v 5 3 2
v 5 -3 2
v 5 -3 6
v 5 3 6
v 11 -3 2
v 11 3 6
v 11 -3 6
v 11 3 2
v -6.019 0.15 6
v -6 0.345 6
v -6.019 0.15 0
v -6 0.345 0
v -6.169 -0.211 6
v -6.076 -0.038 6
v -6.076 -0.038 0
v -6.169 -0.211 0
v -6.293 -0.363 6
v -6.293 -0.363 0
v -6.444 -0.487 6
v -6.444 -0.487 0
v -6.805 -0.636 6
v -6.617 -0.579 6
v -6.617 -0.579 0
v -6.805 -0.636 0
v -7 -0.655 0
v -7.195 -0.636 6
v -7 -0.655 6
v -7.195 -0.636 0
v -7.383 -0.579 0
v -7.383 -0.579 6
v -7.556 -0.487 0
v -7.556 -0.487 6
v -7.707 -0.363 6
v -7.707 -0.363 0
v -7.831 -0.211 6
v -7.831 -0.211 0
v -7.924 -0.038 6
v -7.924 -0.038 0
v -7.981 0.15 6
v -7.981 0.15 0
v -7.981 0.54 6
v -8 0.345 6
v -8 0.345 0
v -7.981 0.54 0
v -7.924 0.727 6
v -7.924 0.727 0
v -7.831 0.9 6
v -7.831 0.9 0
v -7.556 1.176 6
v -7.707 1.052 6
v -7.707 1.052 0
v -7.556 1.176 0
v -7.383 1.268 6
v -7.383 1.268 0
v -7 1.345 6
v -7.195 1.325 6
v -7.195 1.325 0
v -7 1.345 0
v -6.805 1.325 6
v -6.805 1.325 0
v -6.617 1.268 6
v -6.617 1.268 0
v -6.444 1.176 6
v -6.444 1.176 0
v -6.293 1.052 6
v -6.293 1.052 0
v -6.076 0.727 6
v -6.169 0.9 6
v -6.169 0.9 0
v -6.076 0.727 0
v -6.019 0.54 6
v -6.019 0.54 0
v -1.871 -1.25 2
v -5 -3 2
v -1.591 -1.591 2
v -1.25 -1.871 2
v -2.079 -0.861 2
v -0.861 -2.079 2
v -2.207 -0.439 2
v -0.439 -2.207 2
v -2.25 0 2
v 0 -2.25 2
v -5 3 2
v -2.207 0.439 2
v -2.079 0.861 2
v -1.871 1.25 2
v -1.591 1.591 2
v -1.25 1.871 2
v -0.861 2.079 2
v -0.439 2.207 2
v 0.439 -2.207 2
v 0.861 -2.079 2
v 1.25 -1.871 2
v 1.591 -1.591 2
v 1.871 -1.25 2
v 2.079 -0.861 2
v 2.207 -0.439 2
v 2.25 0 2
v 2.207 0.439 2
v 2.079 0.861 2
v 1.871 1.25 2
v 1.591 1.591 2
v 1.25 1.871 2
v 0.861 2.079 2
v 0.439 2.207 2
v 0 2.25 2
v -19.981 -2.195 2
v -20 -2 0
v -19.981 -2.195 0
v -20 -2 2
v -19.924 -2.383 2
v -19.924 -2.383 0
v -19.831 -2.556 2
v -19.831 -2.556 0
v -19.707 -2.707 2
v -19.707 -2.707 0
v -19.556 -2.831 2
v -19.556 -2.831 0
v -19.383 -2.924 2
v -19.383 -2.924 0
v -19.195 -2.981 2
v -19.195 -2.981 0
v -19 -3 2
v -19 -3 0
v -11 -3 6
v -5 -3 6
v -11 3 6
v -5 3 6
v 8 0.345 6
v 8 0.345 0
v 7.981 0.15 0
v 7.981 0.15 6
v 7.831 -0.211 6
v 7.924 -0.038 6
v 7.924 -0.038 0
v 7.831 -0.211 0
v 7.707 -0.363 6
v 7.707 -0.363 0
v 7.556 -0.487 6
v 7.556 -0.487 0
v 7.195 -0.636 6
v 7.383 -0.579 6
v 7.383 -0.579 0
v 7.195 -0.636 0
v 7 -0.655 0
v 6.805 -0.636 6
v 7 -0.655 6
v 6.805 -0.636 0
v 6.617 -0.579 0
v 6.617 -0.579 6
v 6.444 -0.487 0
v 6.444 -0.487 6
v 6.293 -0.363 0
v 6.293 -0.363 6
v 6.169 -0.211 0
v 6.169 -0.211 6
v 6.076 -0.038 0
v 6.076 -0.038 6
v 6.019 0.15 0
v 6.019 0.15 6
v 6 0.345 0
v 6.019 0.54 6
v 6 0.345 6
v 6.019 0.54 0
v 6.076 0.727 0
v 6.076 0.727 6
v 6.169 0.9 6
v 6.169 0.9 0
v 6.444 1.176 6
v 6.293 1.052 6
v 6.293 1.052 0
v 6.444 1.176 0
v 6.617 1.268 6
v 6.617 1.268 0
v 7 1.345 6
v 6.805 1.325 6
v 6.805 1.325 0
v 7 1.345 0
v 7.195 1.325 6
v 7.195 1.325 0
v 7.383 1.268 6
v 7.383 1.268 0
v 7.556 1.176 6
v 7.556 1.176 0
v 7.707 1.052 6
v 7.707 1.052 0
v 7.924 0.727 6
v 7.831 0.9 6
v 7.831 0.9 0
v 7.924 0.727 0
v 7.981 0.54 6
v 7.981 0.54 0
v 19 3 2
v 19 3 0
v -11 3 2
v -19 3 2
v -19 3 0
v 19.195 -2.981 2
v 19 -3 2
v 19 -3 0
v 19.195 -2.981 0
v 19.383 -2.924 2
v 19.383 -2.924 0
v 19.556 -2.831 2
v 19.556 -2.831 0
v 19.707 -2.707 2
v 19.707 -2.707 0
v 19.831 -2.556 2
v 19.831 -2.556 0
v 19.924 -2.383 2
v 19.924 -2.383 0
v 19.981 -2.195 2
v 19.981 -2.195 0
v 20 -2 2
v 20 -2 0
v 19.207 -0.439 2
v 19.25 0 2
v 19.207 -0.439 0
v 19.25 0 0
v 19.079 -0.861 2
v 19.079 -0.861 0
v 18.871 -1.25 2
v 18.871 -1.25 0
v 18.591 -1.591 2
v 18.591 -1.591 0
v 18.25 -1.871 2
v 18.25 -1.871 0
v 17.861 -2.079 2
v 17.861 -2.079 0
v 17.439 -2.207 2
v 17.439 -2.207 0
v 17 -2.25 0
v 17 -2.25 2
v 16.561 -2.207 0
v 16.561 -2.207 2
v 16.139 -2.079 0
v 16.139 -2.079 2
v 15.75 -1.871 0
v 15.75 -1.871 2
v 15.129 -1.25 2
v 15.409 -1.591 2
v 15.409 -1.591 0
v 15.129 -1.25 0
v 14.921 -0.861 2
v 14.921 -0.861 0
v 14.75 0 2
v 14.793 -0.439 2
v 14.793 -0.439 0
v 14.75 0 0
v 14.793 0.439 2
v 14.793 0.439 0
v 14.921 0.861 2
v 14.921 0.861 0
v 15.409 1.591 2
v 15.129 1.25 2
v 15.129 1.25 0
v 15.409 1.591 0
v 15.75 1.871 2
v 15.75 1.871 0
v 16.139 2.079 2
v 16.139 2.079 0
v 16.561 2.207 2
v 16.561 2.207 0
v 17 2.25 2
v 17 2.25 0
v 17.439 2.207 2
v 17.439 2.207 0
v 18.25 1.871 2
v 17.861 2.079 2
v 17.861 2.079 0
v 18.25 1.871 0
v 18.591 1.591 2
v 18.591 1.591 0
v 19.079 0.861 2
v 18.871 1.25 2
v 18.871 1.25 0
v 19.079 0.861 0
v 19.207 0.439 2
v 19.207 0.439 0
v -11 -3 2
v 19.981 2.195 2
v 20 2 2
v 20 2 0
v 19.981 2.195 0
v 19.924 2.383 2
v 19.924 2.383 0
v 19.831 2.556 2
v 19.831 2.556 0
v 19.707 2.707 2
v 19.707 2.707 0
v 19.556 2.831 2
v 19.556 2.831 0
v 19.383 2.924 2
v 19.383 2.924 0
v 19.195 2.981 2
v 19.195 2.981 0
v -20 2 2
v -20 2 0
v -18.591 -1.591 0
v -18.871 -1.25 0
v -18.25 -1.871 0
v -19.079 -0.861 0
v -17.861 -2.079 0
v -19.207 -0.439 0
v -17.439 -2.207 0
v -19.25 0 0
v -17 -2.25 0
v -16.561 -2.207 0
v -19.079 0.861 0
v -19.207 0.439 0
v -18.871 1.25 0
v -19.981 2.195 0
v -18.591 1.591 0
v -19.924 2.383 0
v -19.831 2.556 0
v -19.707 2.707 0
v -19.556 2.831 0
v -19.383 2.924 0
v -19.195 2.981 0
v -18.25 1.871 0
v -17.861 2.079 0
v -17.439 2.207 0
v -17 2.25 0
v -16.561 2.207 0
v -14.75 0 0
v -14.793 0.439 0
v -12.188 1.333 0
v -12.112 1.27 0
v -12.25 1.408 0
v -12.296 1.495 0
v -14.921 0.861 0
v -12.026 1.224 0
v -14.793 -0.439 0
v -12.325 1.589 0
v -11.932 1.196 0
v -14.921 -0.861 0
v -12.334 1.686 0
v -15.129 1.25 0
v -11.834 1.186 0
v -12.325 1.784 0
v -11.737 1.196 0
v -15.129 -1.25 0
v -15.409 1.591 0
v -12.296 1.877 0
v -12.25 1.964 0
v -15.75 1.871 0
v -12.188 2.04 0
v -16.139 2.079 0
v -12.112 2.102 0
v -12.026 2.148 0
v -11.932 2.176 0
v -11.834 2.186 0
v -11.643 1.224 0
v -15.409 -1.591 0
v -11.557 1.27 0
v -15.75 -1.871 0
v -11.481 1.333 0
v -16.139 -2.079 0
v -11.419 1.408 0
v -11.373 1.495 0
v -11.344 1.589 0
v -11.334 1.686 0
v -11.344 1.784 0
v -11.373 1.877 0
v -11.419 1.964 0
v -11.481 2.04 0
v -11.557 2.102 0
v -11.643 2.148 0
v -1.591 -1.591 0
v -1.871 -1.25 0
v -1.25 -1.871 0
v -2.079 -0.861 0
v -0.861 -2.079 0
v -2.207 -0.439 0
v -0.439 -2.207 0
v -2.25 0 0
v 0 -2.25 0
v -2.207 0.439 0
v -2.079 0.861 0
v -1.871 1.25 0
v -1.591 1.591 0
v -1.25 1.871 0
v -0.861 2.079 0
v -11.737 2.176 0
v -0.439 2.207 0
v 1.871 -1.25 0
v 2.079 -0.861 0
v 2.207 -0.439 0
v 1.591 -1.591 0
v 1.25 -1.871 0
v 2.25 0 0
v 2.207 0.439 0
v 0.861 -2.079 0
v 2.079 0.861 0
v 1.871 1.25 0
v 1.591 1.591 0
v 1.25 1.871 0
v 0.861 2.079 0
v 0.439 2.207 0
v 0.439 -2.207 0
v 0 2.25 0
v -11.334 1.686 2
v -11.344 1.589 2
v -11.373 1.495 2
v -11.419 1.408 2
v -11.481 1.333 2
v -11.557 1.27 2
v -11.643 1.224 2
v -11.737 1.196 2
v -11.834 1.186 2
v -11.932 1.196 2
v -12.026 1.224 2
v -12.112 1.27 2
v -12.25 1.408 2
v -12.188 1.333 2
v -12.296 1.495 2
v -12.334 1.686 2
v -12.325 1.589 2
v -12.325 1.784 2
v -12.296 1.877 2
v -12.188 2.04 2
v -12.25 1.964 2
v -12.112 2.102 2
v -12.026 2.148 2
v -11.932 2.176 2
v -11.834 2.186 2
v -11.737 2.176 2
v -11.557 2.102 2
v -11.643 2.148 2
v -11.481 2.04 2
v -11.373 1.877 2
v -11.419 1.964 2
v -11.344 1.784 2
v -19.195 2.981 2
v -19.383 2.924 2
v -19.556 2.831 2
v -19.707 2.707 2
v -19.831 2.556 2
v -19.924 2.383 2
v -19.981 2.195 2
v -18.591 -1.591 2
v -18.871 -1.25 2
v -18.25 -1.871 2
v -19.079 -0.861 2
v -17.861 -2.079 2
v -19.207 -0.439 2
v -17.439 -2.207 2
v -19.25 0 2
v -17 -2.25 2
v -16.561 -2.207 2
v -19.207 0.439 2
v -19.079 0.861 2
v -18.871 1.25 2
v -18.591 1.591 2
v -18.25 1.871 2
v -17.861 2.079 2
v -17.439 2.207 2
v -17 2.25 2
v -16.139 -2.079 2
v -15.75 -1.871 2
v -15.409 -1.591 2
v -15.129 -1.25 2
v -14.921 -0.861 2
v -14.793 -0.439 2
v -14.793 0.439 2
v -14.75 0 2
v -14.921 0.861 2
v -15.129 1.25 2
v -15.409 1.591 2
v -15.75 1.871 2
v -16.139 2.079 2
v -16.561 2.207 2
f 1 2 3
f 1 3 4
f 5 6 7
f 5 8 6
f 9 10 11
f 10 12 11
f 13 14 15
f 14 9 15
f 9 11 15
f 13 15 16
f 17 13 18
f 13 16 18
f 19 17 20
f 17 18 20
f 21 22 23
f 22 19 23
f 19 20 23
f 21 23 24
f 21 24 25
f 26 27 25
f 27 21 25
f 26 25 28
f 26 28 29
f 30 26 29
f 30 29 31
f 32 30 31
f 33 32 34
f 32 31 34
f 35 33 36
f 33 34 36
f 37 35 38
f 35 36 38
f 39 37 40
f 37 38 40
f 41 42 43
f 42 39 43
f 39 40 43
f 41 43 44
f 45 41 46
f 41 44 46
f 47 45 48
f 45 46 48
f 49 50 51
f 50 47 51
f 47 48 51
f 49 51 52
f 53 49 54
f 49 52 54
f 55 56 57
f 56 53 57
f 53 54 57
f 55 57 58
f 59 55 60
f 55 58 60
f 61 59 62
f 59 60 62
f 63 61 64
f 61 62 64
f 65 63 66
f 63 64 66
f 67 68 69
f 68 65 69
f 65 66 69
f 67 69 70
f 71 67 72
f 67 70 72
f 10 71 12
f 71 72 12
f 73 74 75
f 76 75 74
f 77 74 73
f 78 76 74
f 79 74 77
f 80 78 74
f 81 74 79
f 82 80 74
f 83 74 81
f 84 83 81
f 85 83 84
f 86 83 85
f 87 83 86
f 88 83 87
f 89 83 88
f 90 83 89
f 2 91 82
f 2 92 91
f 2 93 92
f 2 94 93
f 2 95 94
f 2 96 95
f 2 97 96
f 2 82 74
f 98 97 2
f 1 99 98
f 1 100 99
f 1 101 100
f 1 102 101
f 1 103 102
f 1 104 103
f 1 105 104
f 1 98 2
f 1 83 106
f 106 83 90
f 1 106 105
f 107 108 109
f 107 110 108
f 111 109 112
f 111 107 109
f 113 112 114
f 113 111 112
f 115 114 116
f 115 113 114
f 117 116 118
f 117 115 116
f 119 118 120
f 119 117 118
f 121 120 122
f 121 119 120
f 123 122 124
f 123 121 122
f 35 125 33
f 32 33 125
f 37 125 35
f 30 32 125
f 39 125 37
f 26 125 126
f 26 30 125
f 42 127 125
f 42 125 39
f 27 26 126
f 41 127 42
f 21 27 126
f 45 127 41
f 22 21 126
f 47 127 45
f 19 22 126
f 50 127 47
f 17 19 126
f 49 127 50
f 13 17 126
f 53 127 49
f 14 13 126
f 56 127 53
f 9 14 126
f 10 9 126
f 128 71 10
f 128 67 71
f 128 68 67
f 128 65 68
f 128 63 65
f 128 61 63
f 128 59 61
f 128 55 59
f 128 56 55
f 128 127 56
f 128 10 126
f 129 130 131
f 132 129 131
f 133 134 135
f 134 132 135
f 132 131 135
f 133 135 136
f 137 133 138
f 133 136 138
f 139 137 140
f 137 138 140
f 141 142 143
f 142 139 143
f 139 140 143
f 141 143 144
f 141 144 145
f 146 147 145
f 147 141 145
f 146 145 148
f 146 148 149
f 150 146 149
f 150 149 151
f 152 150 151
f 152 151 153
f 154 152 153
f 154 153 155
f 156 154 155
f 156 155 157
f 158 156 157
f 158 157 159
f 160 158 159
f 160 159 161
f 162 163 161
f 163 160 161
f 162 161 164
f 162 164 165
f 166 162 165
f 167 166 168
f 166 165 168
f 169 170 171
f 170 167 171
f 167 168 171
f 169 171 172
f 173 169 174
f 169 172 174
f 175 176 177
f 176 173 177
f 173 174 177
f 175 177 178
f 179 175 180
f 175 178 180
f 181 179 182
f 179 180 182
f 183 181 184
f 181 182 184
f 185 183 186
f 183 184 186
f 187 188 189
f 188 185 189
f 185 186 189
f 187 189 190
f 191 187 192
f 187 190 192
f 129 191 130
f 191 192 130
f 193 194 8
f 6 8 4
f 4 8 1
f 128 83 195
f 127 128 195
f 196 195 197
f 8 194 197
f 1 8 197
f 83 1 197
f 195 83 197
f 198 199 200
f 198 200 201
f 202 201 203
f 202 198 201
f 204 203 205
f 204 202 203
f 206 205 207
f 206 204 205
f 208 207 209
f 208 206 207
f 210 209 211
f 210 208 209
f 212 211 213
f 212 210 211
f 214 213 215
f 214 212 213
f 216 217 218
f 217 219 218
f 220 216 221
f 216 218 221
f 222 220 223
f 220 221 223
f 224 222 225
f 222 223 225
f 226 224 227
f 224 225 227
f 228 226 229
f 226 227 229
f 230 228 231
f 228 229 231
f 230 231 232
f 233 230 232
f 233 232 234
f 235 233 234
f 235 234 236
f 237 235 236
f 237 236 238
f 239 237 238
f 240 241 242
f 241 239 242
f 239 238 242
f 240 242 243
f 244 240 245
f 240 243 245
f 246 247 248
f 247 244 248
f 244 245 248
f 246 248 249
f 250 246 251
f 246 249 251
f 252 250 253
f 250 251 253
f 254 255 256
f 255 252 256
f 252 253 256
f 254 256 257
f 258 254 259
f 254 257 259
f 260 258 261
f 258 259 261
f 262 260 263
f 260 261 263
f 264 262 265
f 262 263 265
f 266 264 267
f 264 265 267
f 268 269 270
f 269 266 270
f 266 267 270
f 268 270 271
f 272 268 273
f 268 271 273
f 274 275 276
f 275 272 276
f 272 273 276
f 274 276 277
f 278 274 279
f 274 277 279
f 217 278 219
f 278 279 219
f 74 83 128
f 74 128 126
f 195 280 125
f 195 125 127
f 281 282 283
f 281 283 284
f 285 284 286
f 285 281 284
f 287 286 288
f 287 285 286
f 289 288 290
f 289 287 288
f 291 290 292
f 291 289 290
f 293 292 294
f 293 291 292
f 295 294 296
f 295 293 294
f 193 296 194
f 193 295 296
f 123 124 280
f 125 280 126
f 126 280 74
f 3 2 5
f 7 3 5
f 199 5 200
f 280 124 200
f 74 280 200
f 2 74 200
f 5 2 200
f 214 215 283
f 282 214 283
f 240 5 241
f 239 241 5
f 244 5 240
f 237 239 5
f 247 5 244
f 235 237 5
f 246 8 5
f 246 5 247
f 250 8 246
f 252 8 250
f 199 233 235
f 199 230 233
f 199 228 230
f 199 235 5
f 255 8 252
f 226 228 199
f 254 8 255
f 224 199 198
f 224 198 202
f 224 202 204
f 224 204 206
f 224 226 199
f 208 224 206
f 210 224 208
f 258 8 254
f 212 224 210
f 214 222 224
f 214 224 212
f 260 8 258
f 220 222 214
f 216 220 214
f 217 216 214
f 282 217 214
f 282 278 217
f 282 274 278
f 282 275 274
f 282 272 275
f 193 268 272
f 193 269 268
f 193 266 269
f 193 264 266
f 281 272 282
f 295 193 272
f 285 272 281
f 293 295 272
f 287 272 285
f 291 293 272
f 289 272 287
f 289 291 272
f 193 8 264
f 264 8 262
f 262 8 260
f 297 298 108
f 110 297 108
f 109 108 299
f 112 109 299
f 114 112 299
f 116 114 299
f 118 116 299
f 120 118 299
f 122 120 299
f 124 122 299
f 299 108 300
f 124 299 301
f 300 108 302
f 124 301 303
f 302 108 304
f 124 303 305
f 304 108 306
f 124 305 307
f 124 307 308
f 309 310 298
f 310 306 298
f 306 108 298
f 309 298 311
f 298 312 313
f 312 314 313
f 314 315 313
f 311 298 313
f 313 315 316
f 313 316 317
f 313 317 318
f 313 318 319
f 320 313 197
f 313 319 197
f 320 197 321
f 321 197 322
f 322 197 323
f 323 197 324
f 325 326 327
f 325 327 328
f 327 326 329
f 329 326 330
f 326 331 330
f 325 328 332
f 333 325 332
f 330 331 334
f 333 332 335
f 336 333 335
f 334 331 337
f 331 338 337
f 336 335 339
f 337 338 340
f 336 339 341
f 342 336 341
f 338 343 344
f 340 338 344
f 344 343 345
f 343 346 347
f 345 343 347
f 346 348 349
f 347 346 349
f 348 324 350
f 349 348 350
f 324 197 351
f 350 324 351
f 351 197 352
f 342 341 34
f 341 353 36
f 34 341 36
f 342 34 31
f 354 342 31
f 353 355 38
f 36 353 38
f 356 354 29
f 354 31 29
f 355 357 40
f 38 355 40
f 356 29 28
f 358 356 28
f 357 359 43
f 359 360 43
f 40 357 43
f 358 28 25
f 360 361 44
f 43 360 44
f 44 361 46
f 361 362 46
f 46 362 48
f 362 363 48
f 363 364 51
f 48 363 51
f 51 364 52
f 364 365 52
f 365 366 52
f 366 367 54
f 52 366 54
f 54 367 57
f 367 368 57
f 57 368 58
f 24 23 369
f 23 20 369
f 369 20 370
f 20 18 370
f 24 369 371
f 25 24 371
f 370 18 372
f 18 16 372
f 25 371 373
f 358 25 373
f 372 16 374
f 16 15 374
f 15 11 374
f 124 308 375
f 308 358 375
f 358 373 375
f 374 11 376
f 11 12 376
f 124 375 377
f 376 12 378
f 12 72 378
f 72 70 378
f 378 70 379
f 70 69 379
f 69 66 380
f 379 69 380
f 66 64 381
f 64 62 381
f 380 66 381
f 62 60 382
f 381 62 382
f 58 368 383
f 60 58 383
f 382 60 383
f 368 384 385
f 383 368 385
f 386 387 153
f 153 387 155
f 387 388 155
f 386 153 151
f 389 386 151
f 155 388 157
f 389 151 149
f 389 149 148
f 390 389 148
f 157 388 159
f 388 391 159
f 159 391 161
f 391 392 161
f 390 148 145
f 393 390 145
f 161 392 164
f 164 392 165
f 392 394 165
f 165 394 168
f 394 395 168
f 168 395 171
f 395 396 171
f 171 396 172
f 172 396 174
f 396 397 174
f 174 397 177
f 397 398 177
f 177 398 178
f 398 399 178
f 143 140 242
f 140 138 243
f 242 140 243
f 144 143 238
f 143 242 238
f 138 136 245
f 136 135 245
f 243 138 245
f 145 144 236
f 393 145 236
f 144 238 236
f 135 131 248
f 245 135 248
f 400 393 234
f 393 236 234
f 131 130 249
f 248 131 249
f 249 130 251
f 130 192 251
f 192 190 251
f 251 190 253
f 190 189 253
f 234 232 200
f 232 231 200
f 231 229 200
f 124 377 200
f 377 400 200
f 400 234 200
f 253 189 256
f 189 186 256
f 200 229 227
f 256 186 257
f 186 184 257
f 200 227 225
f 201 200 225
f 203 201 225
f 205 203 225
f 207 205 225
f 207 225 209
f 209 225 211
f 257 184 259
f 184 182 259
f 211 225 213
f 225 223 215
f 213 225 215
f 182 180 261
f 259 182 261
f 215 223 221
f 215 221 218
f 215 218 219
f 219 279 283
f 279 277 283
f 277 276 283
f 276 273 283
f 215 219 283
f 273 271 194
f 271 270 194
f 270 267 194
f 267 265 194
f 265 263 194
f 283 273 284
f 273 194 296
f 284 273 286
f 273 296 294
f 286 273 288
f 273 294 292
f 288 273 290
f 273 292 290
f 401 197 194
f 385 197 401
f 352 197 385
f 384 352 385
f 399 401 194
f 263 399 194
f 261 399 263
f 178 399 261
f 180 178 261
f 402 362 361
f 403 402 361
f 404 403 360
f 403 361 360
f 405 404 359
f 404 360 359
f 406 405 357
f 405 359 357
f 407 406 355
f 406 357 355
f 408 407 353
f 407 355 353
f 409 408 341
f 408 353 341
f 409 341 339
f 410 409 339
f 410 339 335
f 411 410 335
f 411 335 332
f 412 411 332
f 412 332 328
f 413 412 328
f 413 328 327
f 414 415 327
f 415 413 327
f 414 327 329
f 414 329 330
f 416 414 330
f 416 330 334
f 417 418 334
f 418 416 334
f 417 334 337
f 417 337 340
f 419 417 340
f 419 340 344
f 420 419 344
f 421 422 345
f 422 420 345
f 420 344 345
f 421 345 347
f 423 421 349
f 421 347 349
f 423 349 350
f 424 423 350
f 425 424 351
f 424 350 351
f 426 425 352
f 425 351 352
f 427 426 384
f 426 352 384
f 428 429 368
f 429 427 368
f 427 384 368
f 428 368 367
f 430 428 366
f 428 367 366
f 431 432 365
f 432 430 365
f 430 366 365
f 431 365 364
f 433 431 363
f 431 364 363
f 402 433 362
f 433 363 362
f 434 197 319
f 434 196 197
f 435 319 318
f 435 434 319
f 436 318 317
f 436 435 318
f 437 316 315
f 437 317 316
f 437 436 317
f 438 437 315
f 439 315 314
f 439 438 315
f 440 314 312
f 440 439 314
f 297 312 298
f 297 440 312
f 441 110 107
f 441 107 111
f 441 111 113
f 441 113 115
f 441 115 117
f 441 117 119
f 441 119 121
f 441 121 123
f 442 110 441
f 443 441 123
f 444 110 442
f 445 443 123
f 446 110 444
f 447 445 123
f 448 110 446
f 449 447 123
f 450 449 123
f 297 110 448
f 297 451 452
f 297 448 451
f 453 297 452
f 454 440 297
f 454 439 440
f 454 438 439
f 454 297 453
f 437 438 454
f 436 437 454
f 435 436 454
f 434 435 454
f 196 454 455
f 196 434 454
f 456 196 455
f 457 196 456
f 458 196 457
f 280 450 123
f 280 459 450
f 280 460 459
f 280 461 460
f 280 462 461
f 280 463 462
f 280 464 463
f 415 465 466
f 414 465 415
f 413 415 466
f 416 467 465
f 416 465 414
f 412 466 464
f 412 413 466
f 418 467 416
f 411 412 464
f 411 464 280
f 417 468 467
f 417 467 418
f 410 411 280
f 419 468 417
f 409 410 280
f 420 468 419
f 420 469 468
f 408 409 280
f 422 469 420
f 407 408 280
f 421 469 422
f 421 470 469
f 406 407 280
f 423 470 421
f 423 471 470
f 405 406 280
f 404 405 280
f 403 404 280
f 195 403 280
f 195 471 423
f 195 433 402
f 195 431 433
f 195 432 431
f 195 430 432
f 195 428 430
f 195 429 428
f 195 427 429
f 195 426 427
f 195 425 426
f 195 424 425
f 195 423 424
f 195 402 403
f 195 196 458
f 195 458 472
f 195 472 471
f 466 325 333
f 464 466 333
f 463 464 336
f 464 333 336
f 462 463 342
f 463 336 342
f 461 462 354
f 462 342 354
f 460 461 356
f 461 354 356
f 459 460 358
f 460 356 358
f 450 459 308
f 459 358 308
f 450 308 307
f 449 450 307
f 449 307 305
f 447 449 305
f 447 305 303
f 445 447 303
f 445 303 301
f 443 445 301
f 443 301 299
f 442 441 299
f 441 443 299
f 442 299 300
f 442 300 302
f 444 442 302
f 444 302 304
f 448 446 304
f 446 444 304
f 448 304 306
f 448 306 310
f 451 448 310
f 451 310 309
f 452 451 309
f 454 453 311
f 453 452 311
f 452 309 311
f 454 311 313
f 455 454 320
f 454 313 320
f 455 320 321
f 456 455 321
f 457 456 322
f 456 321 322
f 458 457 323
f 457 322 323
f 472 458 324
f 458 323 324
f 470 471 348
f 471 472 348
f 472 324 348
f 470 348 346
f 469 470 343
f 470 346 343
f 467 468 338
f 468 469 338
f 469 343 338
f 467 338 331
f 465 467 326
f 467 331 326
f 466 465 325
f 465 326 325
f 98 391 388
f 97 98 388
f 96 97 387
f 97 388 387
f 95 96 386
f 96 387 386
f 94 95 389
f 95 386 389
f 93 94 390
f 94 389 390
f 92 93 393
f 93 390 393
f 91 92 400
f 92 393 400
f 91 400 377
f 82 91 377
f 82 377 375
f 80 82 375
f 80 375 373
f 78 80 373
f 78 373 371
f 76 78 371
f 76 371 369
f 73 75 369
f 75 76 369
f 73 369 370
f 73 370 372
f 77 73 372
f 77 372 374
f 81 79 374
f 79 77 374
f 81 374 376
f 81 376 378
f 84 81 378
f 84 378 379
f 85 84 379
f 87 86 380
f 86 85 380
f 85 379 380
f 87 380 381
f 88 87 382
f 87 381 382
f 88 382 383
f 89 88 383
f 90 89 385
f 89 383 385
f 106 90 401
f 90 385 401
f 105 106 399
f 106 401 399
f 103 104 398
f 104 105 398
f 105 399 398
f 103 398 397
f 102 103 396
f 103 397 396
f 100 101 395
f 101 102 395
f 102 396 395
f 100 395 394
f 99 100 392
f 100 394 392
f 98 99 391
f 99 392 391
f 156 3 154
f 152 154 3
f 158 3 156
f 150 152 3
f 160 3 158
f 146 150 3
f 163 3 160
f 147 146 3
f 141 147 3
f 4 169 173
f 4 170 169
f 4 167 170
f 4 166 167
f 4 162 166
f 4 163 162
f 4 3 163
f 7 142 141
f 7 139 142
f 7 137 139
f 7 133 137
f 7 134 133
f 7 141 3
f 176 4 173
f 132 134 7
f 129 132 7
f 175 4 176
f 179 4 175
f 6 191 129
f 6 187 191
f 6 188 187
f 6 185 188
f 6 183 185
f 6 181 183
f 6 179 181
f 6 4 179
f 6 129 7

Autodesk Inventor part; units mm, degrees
ref_plane "YZ Plane" through (0, 0, 0) normal (1, 0, 0) x (0, 1, 0)
ref_plane "XZ Plane" through (0, 0, 0) normal (0, 1, 0) x (-1, 0, 0)
ref_plane "XY Plane" through (0, 0, 0) normal (0, 0, 1) x (1, 0, 0)
sketch "Sketch1" plane through (0, 0, 0) normal (0, 0, 1) x (1, 0, 0)
  line L0 (-20, -3) -> (20, -3) construction
  circle A0 centre (-17, 0) radius 2.25
  circle A1 centre (17, 0) radius 2.25
  circle A2 centre (0, 0) radius 2.25
  circle A3 centre (-7, 0.3446) radius 1
  circle A4 centre (7, 0.3446) radius 1
  line L1 (-23.9554, 0) -> (25.6733, 0) construction
  line L2 (0, 11.421) -> (0, -11.2937) construction
  line L3 (-20, -3) -> (20, -3)
  line L4 (20, -3) -> (20, 3)
  line L5 (20, 3) -> (-20, 3)
  line L6 (-20, 3) -> (-20, -3)
  circle A5 centre (-11.8345, 1.6861) radius 0.5
  line L7 (-11, 3) -> (-5, 3)
  line L8 (-5, 3) -> (-5, -3)
  line L9 (-5, -3) -> (-11, -3)
  line L10 (-11, -3) -> (-11, 3)
  line L11 (5, 3) -> (11, 3)
  line L12 (11, 3) -> (11, -3)
  line L13 (11, -3) -> (5, -3)
  line L14 (5, -3) -> (5, 3)
  point P0 (0, 0)
  point P1 (0, -3)
  point P2 (0, -3)
  point P3 (-2.8751, -5.808)
  point P4 (2.8751, -5.808)
  dimension "d0" = 40
  dimension "d1" = 4.5
  dimension "d2" = 4.5
  dimension "d3" = 3
  dimension "d4" = 4.5
  dimension "d5" = 3
  dimension "d6" = 3.3446
  dimension "d7" = 3.3446
  dimension "d8" = 3
  dimension "d9" = 17
  dimension "d10" = 17
  dimension "d11" = 3
  dimension "d12" = 3
  dimension "d13" = 3
  dimension "d14" = 3
  dimension "d16" = 1
  dimension "d20" = 6
  dimension "d22" = 5
  dimension "d23" = 5
  dimension "d24" = 6
extrude "Extrusion1" add sketch "Sketch1" along normal blind 2
fillet "Fillet1" radius 1 4 edges at (-20, 3, 1) (-20, -3, 1) (20, 3, 1) (20, -3, 1)
extrude "Extrusion2" add sketch "Sketch1" along normal blind 6 contours L10 L5 L8 L3 | L14 L5 L12 L3
properties part number "Bar_Extruded"
